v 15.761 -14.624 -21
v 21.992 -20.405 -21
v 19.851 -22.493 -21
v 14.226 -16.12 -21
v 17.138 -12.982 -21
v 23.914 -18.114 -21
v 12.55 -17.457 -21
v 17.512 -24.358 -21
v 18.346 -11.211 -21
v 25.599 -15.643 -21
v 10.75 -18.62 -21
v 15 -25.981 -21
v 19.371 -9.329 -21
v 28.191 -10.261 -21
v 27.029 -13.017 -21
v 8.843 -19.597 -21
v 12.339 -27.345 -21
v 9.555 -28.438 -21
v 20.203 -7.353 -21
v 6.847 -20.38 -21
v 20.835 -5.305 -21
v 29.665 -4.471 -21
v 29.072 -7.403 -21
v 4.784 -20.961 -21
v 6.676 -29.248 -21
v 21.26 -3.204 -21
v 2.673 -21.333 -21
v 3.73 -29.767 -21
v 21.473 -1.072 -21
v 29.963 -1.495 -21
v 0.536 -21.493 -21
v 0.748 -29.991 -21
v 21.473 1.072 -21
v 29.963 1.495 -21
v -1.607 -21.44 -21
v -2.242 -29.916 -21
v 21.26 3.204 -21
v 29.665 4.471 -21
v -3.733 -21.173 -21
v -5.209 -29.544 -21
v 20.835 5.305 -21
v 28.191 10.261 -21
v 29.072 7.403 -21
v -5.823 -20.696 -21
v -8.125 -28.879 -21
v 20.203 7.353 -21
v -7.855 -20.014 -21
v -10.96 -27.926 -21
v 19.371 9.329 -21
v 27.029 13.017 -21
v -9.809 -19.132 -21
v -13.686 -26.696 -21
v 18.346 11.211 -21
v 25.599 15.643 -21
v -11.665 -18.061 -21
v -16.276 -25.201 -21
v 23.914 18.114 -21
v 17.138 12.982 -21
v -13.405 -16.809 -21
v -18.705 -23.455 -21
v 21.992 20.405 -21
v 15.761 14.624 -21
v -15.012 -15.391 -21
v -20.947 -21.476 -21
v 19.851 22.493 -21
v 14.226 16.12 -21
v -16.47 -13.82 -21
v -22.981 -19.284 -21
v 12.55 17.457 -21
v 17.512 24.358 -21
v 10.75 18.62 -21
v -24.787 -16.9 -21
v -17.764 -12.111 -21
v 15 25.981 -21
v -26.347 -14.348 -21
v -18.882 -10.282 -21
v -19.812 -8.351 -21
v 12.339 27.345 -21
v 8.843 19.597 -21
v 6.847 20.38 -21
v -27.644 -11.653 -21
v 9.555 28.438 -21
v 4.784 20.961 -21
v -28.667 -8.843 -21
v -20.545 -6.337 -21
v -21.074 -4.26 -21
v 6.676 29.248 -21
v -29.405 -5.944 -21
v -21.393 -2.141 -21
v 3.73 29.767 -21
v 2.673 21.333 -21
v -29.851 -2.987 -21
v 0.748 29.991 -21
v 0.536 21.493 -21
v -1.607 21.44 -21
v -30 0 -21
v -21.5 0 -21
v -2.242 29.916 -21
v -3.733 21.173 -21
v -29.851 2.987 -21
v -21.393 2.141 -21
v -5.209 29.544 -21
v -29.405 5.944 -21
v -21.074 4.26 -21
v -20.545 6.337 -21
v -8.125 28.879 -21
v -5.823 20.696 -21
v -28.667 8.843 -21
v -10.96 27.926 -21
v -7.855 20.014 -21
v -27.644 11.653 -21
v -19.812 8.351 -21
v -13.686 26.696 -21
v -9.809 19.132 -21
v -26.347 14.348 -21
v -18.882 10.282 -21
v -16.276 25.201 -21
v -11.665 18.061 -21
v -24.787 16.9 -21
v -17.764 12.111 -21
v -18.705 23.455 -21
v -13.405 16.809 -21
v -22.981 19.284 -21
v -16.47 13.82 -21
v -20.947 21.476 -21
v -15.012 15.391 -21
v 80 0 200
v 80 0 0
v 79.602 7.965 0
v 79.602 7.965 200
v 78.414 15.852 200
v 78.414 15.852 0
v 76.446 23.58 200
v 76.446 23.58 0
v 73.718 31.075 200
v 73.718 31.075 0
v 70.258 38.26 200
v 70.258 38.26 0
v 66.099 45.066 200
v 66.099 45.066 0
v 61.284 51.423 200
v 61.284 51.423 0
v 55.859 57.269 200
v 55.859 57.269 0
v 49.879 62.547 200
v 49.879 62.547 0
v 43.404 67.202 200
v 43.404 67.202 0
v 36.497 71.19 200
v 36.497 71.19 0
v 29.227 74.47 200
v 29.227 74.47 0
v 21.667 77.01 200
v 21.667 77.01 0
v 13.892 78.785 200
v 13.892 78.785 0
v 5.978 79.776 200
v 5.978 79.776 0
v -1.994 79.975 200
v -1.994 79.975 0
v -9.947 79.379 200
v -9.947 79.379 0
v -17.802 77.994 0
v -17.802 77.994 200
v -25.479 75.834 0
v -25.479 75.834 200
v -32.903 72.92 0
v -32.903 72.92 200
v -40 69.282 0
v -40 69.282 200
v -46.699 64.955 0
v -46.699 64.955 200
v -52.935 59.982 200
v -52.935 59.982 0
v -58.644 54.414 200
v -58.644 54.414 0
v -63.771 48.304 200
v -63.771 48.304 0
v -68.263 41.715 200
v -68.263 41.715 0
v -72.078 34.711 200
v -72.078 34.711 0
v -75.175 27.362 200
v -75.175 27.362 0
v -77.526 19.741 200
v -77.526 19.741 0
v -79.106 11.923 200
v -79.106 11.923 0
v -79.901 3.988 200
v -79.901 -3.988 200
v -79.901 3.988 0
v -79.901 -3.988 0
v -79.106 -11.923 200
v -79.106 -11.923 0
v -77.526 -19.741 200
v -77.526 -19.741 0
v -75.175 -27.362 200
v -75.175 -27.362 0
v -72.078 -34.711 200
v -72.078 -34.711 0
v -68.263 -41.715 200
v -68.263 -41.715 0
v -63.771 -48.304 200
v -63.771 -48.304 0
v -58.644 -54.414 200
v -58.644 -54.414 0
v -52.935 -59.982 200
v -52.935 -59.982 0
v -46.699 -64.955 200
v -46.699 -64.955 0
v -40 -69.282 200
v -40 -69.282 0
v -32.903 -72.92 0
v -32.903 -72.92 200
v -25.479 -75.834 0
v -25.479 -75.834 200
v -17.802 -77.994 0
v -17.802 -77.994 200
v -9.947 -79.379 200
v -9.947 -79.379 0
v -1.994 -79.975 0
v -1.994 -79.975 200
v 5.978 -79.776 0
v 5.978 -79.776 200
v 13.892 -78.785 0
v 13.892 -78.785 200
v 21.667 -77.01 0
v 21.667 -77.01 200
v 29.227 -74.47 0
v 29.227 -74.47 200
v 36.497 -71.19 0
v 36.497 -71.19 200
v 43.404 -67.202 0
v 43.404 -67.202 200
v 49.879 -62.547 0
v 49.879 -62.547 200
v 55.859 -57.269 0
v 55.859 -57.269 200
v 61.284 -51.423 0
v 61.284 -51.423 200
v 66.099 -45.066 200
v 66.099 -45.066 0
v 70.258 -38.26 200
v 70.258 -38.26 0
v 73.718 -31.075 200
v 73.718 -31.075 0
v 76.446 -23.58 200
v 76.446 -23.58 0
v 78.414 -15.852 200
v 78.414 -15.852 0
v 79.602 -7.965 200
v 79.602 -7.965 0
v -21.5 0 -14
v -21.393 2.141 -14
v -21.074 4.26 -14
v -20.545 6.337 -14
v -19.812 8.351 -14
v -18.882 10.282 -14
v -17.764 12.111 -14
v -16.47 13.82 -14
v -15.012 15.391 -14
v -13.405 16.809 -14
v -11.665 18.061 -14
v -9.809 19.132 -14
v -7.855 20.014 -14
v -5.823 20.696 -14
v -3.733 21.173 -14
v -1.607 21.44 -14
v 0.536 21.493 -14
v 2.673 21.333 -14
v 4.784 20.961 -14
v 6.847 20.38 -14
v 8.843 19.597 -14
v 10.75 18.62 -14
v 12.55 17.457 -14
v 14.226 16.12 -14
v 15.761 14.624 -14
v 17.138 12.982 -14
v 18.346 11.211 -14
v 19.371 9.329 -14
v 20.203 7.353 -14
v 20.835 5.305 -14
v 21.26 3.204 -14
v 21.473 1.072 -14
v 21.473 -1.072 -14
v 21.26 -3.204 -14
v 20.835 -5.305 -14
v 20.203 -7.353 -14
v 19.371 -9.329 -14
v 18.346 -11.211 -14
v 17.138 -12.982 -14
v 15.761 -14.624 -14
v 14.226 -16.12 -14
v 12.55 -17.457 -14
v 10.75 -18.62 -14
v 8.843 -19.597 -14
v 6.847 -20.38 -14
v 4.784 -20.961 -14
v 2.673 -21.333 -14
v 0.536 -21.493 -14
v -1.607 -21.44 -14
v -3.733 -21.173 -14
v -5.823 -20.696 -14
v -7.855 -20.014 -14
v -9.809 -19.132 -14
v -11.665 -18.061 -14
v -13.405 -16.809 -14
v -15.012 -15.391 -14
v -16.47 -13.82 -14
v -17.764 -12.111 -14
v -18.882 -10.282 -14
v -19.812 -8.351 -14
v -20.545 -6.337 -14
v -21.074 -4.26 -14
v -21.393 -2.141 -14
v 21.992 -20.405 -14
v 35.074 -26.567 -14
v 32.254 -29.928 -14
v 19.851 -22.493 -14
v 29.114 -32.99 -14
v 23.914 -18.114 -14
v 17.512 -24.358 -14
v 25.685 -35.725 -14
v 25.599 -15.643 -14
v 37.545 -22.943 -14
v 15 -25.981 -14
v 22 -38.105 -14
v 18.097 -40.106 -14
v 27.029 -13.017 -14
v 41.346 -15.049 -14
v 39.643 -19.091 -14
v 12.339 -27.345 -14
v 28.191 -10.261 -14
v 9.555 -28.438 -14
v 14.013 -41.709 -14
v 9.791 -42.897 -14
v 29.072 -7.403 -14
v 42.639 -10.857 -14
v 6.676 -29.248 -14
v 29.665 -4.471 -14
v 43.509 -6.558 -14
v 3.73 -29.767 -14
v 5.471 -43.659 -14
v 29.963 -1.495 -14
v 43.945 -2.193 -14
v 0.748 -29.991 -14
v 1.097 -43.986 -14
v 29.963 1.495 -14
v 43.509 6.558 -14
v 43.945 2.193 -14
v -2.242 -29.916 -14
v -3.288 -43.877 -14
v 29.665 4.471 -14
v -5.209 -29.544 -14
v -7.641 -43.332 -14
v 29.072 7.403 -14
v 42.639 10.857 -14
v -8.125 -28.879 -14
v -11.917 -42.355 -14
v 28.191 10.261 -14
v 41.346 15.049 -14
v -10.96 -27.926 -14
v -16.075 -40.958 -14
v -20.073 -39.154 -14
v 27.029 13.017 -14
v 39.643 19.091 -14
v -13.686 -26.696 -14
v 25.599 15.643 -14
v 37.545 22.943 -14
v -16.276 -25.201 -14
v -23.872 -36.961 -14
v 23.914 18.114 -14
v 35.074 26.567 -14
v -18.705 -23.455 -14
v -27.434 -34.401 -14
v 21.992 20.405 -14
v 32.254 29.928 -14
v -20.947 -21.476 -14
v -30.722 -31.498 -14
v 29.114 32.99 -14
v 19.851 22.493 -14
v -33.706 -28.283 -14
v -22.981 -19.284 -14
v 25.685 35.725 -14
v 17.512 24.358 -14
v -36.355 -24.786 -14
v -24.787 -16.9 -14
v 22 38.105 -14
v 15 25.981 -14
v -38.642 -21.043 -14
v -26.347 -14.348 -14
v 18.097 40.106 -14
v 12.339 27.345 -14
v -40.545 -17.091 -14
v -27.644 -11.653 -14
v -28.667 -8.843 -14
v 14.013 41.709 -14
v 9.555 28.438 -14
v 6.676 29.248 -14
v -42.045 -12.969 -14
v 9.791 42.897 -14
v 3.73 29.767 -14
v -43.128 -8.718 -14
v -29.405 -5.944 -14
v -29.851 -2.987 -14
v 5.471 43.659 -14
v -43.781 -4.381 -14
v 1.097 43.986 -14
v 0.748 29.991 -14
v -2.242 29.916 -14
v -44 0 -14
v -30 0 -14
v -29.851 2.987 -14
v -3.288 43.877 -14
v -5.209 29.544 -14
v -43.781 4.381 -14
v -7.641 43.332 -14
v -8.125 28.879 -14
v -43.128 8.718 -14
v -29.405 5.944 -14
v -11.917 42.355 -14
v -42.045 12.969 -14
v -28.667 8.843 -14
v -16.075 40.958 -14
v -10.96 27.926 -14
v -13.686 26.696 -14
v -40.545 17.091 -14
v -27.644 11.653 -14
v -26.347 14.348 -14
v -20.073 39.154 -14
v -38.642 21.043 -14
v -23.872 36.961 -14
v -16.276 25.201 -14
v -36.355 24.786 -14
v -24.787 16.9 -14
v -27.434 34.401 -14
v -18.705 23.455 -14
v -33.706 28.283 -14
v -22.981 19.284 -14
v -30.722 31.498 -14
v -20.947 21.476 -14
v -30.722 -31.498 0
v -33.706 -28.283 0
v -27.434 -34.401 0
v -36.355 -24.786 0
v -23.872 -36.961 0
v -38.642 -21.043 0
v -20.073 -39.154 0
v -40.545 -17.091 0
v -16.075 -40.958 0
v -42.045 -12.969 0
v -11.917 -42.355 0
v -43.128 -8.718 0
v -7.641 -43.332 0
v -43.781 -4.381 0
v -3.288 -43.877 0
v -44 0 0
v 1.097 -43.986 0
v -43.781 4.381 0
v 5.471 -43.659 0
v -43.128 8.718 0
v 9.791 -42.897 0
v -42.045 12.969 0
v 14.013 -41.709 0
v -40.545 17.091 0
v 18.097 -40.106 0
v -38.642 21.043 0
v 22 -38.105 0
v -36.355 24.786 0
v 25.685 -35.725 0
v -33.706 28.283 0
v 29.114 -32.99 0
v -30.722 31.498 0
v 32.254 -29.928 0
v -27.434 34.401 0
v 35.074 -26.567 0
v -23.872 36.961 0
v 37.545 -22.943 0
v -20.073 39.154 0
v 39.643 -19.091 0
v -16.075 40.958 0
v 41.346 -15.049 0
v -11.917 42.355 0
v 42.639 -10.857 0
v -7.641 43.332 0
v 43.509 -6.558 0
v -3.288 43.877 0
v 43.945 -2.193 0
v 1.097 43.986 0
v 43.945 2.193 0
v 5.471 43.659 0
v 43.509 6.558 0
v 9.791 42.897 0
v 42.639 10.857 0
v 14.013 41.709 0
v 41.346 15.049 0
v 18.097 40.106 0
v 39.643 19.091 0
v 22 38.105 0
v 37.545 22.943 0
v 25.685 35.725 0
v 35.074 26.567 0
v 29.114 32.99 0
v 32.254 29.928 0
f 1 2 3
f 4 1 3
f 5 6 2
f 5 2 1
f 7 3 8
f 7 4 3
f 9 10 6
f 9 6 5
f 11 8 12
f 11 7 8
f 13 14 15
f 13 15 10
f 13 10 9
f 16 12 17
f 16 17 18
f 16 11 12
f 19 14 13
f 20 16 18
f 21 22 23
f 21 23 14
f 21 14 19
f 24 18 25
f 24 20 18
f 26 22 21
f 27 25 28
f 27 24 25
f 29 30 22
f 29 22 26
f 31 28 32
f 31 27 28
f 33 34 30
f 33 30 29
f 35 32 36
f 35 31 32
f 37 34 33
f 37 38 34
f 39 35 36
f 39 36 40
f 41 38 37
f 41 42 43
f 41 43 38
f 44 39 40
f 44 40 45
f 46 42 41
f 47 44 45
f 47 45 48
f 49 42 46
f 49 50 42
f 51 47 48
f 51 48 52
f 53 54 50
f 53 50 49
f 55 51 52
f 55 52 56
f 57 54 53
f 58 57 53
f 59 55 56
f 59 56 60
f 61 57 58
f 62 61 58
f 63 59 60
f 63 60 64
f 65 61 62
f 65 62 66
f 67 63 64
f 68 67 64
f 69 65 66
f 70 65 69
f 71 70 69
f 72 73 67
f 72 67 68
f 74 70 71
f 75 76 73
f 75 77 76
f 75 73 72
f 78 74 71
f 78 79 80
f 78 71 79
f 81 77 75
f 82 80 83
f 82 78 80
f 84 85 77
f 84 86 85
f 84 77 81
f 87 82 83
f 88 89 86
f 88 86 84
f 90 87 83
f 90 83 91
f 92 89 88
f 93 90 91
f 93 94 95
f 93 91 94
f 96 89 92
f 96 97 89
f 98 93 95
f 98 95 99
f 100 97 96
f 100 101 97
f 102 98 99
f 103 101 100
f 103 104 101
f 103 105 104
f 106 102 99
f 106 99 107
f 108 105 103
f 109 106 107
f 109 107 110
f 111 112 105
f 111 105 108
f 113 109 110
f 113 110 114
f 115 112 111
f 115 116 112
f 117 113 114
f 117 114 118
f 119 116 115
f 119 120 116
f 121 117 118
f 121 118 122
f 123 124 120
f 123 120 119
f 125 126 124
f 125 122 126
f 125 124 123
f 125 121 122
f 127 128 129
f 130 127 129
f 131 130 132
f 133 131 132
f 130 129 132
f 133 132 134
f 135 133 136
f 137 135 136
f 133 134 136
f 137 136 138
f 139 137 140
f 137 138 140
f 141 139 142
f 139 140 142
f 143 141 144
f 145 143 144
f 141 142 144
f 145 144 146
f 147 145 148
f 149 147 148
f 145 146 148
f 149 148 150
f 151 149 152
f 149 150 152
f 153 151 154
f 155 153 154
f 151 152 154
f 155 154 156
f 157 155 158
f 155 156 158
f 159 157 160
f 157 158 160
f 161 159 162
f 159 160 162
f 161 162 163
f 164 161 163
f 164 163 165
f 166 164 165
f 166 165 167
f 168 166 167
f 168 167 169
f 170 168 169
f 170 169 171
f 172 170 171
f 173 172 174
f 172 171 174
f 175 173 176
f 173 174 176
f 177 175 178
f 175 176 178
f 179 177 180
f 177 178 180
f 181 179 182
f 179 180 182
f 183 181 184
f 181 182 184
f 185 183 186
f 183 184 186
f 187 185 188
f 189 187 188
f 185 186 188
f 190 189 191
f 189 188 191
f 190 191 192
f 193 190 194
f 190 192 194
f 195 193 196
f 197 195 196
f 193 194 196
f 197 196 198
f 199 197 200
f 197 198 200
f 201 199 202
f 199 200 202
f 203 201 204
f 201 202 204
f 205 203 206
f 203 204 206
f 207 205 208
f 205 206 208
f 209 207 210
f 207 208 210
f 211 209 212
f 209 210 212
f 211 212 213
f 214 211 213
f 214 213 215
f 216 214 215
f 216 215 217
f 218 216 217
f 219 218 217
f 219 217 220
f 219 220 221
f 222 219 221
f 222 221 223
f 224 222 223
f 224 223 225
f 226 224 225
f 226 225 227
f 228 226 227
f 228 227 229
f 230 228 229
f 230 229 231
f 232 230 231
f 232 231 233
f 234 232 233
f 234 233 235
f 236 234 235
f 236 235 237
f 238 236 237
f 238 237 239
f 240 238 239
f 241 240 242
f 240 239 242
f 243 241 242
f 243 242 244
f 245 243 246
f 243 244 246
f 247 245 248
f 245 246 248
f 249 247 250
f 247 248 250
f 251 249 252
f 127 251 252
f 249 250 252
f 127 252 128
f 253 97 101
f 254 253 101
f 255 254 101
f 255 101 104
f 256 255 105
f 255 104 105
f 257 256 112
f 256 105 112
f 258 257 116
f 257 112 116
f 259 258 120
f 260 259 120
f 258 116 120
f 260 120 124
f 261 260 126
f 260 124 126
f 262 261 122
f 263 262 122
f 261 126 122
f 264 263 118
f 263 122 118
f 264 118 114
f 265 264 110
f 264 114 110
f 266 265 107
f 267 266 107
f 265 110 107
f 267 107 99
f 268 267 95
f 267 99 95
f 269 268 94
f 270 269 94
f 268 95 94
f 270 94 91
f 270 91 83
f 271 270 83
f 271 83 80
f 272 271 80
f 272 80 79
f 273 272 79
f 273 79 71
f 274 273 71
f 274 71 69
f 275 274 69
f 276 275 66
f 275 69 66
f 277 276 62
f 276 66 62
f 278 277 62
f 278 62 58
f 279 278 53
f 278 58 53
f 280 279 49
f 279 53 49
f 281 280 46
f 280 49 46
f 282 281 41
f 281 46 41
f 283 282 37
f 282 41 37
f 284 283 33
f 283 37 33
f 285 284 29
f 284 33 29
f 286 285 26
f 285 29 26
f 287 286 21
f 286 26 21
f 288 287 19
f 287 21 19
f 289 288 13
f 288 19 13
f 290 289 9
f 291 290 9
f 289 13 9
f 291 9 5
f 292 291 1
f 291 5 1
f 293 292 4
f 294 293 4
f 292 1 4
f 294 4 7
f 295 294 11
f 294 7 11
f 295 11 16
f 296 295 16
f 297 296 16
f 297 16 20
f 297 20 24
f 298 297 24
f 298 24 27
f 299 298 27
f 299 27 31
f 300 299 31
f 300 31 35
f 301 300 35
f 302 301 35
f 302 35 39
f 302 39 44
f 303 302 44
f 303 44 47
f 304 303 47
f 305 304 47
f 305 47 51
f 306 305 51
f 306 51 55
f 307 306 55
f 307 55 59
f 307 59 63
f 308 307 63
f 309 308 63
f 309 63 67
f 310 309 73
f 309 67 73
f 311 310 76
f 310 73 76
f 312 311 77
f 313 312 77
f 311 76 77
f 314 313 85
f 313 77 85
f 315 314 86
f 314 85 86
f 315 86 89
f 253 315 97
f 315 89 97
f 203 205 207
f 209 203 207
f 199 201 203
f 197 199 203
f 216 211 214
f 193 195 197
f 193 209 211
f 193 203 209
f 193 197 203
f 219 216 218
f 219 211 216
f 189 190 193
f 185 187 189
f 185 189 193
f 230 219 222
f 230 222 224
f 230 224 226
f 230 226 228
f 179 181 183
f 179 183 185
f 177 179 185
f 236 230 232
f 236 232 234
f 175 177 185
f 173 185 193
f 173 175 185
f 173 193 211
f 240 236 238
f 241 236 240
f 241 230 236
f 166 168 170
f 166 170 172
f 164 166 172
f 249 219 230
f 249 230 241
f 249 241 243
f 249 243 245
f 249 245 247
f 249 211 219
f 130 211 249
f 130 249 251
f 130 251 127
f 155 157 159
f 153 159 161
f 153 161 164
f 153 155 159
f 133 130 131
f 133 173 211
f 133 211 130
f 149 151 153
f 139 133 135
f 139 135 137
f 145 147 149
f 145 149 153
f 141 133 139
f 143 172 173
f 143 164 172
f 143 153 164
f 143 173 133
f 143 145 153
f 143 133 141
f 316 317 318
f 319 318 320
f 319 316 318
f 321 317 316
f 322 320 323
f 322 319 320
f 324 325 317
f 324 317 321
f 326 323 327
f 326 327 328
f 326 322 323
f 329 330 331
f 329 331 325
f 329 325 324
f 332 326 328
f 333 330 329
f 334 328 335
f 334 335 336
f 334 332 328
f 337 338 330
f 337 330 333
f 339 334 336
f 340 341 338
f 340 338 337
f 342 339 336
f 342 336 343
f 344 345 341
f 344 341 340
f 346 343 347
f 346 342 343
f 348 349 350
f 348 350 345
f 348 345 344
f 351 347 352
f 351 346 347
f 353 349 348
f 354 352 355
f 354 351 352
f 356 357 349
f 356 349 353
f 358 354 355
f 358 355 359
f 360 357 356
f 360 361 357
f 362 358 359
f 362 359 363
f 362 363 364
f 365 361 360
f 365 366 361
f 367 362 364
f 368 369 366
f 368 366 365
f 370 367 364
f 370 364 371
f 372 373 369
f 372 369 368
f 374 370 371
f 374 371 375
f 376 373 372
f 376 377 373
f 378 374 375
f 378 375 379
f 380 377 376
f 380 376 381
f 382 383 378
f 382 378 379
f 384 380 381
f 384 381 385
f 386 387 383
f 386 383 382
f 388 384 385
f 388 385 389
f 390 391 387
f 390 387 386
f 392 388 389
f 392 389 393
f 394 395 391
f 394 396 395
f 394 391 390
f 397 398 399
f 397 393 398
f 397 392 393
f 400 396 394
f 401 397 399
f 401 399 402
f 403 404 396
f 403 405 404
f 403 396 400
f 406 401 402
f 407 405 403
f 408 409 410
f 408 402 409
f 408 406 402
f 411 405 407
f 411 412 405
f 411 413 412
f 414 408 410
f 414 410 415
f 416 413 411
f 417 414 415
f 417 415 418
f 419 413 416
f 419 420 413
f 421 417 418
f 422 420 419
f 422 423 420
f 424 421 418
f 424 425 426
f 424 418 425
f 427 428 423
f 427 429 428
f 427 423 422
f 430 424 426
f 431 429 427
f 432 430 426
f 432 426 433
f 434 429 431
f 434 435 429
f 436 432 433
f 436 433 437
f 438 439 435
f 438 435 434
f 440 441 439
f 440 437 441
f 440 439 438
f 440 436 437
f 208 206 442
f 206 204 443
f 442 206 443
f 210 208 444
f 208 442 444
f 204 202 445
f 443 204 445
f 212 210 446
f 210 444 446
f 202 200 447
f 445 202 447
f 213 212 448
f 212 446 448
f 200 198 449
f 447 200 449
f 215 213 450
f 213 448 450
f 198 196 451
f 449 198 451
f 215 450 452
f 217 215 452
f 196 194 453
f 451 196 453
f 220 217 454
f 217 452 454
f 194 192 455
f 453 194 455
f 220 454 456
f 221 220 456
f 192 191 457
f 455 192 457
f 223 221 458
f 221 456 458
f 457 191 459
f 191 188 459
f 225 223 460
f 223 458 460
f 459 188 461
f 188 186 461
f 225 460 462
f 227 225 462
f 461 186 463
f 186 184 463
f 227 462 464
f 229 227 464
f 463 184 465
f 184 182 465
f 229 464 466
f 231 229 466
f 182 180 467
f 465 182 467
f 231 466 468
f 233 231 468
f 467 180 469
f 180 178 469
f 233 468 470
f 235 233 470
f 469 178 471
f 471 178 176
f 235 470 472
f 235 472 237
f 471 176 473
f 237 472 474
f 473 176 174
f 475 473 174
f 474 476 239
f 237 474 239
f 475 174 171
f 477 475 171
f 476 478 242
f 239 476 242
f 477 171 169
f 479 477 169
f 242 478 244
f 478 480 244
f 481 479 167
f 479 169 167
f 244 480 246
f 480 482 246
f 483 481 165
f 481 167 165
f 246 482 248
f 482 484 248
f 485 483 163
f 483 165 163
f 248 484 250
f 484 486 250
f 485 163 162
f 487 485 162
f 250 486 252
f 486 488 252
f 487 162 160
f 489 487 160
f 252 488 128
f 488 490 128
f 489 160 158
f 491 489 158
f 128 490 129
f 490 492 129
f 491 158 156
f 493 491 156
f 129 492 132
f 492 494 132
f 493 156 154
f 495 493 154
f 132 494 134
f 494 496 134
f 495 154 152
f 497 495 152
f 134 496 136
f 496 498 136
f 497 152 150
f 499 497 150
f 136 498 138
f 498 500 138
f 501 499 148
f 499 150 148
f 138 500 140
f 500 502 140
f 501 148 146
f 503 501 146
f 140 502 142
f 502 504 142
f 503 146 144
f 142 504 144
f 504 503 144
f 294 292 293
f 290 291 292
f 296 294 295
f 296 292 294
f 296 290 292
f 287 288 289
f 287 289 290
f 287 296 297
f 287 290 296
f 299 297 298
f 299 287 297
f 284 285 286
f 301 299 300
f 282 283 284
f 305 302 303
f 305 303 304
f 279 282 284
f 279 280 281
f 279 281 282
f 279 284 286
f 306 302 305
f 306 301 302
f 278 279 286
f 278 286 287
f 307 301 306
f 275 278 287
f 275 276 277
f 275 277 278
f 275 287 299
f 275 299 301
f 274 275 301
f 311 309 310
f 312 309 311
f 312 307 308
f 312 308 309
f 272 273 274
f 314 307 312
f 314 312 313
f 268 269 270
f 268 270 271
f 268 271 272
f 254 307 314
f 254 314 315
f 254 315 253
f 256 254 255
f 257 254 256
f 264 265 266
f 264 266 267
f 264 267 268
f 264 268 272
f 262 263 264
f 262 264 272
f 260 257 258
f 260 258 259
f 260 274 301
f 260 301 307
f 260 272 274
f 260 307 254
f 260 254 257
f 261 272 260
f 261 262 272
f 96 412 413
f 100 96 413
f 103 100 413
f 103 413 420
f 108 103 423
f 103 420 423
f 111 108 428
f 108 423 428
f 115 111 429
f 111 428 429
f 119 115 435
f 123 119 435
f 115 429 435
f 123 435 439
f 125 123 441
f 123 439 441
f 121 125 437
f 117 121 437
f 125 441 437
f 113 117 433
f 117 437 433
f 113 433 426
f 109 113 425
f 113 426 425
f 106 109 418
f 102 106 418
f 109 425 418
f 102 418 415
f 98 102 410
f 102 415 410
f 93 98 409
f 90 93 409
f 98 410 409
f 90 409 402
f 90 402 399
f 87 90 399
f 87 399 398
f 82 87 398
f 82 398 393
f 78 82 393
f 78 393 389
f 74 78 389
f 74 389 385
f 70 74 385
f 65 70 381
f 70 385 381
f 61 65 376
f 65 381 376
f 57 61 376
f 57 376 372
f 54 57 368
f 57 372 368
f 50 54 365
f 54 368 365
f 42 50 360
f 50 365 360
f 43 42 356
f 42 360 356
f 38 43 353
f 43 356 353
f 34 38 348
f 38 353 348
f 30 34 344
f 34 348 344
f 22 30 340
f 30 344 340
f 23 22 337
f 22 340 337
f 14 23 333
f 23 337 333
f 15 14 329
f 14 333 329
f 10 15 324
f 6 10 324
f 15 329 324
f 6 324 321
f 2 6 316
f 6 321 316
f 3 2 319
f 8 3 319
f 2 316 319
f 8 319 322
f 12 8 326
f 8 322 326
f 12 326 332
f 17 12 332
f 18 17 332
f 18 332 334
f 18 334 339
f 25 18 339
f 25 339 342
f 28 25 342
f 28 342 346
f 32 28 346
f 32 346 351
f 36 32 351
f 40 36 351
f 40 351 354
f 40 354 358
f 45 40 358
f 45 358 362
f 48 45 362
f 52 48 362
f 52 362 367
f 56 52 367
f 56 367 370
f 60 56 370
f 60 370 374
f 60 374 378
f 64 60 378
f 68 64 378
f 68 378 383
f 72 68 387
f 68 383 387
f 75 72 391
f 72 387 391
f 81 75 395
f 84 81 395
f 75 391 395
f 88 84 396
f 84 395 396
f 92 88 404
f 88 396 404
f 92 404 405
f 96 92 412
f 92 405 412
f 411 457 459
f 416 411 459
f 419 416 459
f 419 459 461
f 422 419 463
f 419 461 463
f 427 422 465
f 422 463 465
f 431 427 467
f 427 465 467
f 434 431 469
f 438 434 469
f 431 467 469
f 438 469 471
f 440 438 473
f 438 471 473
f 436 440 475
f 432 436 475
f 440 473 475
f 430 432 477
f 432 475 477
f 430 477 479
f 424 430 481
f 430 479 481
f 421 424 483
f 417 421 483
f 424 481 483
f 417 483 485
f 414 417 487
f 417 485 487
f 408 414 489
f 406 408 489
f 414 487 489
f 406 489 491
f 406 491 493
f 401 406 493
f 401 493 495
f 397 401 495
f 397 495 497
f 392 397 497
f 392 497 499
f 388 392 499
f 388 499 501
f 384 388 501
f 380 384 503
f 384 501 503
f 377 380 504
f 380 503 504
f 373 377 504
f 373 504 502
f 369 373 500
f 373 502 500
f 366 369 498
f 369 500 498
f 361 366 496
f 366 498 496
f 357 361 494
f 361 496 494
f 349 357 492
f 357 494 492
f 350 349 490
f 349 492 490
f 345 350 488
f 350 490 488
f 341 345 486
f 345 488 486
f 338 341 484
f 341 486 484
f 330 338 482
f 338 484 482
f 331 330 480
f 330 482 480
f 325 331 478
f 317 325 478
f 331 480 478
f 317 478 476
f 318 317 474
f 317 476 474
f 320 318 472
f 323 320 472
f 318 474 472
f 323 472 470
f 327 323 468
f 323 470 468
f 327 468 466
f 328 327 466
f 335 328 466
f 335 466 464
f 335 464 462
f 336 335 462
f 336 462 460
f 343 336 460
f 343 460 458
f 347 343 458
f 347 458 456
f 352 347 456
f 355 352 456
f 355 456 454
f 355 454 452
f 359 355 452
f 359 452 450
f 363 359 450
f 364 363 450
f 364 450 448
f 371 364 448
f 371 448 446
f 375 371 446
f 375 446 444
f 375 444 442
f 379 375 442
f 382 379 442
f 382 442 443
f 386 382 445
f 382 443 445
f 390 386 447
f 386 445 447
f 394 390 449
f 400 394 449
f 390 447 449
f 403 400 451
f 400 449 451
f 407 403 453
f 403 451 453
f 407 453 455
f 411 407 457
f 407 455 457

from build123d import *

# Parameters (mm, degrees)
SKETCH1_R           = 80
BOSS_EXTRUDE1_DEPTH = 200
SKETCH2_R           = 44
BOSS_EXTRUDE2_DEPTH = 14
SKETCH3_R           = 30
BOSS_EXTRUDE3_DEPTH = 7
SKETCH4_R           = 21.5
CUT_EXTRUDE1_DEPTH  = 7


with BuildPart() as part:
    # Sketch1 → Boss-Extrude1 (new body)
    with BuildSketch(Plane.XY):
        Circle(SKETCH1_R)
    extrude(amount=BOSS_EXTRUDE1_DEPTH)

    # Sketch2 → Boss-Extrude2 (add)
    with BuildSketch(Plane(origin=(0, 0, 0), x_dir=(-1, 0, 0), z_dir=(0, 0, -1))):
        Circle(SKETCH2_R)
    extrude(amount=BOSS_EXTRUDE2_DEPTH)

    # Sketch3 → Boss-Extrude3 (add)
    with BuildSketch(Plane(origin=(0, 0, -14), x_dir=(-1, 0, 0), z_dir=(0, 0, -1))):
        Circle(SKETCH3_R)
    extrude(amount=BOSS_EXTRUDE3_DEPTH)

    # Sketch4 → Cut-Extrude1 (cut)
    with BuildSketch(Plane(origin=(0, 0, -21), x_dir=(-1, 0, 0), z_dir=(0, 0, -1))):
        Circle(SKETCH4_R)
    extrude(amount=-CUT_EXTRUDE1_DEPTH, mode=Mode.SUBTRACT)


solid = part.part
